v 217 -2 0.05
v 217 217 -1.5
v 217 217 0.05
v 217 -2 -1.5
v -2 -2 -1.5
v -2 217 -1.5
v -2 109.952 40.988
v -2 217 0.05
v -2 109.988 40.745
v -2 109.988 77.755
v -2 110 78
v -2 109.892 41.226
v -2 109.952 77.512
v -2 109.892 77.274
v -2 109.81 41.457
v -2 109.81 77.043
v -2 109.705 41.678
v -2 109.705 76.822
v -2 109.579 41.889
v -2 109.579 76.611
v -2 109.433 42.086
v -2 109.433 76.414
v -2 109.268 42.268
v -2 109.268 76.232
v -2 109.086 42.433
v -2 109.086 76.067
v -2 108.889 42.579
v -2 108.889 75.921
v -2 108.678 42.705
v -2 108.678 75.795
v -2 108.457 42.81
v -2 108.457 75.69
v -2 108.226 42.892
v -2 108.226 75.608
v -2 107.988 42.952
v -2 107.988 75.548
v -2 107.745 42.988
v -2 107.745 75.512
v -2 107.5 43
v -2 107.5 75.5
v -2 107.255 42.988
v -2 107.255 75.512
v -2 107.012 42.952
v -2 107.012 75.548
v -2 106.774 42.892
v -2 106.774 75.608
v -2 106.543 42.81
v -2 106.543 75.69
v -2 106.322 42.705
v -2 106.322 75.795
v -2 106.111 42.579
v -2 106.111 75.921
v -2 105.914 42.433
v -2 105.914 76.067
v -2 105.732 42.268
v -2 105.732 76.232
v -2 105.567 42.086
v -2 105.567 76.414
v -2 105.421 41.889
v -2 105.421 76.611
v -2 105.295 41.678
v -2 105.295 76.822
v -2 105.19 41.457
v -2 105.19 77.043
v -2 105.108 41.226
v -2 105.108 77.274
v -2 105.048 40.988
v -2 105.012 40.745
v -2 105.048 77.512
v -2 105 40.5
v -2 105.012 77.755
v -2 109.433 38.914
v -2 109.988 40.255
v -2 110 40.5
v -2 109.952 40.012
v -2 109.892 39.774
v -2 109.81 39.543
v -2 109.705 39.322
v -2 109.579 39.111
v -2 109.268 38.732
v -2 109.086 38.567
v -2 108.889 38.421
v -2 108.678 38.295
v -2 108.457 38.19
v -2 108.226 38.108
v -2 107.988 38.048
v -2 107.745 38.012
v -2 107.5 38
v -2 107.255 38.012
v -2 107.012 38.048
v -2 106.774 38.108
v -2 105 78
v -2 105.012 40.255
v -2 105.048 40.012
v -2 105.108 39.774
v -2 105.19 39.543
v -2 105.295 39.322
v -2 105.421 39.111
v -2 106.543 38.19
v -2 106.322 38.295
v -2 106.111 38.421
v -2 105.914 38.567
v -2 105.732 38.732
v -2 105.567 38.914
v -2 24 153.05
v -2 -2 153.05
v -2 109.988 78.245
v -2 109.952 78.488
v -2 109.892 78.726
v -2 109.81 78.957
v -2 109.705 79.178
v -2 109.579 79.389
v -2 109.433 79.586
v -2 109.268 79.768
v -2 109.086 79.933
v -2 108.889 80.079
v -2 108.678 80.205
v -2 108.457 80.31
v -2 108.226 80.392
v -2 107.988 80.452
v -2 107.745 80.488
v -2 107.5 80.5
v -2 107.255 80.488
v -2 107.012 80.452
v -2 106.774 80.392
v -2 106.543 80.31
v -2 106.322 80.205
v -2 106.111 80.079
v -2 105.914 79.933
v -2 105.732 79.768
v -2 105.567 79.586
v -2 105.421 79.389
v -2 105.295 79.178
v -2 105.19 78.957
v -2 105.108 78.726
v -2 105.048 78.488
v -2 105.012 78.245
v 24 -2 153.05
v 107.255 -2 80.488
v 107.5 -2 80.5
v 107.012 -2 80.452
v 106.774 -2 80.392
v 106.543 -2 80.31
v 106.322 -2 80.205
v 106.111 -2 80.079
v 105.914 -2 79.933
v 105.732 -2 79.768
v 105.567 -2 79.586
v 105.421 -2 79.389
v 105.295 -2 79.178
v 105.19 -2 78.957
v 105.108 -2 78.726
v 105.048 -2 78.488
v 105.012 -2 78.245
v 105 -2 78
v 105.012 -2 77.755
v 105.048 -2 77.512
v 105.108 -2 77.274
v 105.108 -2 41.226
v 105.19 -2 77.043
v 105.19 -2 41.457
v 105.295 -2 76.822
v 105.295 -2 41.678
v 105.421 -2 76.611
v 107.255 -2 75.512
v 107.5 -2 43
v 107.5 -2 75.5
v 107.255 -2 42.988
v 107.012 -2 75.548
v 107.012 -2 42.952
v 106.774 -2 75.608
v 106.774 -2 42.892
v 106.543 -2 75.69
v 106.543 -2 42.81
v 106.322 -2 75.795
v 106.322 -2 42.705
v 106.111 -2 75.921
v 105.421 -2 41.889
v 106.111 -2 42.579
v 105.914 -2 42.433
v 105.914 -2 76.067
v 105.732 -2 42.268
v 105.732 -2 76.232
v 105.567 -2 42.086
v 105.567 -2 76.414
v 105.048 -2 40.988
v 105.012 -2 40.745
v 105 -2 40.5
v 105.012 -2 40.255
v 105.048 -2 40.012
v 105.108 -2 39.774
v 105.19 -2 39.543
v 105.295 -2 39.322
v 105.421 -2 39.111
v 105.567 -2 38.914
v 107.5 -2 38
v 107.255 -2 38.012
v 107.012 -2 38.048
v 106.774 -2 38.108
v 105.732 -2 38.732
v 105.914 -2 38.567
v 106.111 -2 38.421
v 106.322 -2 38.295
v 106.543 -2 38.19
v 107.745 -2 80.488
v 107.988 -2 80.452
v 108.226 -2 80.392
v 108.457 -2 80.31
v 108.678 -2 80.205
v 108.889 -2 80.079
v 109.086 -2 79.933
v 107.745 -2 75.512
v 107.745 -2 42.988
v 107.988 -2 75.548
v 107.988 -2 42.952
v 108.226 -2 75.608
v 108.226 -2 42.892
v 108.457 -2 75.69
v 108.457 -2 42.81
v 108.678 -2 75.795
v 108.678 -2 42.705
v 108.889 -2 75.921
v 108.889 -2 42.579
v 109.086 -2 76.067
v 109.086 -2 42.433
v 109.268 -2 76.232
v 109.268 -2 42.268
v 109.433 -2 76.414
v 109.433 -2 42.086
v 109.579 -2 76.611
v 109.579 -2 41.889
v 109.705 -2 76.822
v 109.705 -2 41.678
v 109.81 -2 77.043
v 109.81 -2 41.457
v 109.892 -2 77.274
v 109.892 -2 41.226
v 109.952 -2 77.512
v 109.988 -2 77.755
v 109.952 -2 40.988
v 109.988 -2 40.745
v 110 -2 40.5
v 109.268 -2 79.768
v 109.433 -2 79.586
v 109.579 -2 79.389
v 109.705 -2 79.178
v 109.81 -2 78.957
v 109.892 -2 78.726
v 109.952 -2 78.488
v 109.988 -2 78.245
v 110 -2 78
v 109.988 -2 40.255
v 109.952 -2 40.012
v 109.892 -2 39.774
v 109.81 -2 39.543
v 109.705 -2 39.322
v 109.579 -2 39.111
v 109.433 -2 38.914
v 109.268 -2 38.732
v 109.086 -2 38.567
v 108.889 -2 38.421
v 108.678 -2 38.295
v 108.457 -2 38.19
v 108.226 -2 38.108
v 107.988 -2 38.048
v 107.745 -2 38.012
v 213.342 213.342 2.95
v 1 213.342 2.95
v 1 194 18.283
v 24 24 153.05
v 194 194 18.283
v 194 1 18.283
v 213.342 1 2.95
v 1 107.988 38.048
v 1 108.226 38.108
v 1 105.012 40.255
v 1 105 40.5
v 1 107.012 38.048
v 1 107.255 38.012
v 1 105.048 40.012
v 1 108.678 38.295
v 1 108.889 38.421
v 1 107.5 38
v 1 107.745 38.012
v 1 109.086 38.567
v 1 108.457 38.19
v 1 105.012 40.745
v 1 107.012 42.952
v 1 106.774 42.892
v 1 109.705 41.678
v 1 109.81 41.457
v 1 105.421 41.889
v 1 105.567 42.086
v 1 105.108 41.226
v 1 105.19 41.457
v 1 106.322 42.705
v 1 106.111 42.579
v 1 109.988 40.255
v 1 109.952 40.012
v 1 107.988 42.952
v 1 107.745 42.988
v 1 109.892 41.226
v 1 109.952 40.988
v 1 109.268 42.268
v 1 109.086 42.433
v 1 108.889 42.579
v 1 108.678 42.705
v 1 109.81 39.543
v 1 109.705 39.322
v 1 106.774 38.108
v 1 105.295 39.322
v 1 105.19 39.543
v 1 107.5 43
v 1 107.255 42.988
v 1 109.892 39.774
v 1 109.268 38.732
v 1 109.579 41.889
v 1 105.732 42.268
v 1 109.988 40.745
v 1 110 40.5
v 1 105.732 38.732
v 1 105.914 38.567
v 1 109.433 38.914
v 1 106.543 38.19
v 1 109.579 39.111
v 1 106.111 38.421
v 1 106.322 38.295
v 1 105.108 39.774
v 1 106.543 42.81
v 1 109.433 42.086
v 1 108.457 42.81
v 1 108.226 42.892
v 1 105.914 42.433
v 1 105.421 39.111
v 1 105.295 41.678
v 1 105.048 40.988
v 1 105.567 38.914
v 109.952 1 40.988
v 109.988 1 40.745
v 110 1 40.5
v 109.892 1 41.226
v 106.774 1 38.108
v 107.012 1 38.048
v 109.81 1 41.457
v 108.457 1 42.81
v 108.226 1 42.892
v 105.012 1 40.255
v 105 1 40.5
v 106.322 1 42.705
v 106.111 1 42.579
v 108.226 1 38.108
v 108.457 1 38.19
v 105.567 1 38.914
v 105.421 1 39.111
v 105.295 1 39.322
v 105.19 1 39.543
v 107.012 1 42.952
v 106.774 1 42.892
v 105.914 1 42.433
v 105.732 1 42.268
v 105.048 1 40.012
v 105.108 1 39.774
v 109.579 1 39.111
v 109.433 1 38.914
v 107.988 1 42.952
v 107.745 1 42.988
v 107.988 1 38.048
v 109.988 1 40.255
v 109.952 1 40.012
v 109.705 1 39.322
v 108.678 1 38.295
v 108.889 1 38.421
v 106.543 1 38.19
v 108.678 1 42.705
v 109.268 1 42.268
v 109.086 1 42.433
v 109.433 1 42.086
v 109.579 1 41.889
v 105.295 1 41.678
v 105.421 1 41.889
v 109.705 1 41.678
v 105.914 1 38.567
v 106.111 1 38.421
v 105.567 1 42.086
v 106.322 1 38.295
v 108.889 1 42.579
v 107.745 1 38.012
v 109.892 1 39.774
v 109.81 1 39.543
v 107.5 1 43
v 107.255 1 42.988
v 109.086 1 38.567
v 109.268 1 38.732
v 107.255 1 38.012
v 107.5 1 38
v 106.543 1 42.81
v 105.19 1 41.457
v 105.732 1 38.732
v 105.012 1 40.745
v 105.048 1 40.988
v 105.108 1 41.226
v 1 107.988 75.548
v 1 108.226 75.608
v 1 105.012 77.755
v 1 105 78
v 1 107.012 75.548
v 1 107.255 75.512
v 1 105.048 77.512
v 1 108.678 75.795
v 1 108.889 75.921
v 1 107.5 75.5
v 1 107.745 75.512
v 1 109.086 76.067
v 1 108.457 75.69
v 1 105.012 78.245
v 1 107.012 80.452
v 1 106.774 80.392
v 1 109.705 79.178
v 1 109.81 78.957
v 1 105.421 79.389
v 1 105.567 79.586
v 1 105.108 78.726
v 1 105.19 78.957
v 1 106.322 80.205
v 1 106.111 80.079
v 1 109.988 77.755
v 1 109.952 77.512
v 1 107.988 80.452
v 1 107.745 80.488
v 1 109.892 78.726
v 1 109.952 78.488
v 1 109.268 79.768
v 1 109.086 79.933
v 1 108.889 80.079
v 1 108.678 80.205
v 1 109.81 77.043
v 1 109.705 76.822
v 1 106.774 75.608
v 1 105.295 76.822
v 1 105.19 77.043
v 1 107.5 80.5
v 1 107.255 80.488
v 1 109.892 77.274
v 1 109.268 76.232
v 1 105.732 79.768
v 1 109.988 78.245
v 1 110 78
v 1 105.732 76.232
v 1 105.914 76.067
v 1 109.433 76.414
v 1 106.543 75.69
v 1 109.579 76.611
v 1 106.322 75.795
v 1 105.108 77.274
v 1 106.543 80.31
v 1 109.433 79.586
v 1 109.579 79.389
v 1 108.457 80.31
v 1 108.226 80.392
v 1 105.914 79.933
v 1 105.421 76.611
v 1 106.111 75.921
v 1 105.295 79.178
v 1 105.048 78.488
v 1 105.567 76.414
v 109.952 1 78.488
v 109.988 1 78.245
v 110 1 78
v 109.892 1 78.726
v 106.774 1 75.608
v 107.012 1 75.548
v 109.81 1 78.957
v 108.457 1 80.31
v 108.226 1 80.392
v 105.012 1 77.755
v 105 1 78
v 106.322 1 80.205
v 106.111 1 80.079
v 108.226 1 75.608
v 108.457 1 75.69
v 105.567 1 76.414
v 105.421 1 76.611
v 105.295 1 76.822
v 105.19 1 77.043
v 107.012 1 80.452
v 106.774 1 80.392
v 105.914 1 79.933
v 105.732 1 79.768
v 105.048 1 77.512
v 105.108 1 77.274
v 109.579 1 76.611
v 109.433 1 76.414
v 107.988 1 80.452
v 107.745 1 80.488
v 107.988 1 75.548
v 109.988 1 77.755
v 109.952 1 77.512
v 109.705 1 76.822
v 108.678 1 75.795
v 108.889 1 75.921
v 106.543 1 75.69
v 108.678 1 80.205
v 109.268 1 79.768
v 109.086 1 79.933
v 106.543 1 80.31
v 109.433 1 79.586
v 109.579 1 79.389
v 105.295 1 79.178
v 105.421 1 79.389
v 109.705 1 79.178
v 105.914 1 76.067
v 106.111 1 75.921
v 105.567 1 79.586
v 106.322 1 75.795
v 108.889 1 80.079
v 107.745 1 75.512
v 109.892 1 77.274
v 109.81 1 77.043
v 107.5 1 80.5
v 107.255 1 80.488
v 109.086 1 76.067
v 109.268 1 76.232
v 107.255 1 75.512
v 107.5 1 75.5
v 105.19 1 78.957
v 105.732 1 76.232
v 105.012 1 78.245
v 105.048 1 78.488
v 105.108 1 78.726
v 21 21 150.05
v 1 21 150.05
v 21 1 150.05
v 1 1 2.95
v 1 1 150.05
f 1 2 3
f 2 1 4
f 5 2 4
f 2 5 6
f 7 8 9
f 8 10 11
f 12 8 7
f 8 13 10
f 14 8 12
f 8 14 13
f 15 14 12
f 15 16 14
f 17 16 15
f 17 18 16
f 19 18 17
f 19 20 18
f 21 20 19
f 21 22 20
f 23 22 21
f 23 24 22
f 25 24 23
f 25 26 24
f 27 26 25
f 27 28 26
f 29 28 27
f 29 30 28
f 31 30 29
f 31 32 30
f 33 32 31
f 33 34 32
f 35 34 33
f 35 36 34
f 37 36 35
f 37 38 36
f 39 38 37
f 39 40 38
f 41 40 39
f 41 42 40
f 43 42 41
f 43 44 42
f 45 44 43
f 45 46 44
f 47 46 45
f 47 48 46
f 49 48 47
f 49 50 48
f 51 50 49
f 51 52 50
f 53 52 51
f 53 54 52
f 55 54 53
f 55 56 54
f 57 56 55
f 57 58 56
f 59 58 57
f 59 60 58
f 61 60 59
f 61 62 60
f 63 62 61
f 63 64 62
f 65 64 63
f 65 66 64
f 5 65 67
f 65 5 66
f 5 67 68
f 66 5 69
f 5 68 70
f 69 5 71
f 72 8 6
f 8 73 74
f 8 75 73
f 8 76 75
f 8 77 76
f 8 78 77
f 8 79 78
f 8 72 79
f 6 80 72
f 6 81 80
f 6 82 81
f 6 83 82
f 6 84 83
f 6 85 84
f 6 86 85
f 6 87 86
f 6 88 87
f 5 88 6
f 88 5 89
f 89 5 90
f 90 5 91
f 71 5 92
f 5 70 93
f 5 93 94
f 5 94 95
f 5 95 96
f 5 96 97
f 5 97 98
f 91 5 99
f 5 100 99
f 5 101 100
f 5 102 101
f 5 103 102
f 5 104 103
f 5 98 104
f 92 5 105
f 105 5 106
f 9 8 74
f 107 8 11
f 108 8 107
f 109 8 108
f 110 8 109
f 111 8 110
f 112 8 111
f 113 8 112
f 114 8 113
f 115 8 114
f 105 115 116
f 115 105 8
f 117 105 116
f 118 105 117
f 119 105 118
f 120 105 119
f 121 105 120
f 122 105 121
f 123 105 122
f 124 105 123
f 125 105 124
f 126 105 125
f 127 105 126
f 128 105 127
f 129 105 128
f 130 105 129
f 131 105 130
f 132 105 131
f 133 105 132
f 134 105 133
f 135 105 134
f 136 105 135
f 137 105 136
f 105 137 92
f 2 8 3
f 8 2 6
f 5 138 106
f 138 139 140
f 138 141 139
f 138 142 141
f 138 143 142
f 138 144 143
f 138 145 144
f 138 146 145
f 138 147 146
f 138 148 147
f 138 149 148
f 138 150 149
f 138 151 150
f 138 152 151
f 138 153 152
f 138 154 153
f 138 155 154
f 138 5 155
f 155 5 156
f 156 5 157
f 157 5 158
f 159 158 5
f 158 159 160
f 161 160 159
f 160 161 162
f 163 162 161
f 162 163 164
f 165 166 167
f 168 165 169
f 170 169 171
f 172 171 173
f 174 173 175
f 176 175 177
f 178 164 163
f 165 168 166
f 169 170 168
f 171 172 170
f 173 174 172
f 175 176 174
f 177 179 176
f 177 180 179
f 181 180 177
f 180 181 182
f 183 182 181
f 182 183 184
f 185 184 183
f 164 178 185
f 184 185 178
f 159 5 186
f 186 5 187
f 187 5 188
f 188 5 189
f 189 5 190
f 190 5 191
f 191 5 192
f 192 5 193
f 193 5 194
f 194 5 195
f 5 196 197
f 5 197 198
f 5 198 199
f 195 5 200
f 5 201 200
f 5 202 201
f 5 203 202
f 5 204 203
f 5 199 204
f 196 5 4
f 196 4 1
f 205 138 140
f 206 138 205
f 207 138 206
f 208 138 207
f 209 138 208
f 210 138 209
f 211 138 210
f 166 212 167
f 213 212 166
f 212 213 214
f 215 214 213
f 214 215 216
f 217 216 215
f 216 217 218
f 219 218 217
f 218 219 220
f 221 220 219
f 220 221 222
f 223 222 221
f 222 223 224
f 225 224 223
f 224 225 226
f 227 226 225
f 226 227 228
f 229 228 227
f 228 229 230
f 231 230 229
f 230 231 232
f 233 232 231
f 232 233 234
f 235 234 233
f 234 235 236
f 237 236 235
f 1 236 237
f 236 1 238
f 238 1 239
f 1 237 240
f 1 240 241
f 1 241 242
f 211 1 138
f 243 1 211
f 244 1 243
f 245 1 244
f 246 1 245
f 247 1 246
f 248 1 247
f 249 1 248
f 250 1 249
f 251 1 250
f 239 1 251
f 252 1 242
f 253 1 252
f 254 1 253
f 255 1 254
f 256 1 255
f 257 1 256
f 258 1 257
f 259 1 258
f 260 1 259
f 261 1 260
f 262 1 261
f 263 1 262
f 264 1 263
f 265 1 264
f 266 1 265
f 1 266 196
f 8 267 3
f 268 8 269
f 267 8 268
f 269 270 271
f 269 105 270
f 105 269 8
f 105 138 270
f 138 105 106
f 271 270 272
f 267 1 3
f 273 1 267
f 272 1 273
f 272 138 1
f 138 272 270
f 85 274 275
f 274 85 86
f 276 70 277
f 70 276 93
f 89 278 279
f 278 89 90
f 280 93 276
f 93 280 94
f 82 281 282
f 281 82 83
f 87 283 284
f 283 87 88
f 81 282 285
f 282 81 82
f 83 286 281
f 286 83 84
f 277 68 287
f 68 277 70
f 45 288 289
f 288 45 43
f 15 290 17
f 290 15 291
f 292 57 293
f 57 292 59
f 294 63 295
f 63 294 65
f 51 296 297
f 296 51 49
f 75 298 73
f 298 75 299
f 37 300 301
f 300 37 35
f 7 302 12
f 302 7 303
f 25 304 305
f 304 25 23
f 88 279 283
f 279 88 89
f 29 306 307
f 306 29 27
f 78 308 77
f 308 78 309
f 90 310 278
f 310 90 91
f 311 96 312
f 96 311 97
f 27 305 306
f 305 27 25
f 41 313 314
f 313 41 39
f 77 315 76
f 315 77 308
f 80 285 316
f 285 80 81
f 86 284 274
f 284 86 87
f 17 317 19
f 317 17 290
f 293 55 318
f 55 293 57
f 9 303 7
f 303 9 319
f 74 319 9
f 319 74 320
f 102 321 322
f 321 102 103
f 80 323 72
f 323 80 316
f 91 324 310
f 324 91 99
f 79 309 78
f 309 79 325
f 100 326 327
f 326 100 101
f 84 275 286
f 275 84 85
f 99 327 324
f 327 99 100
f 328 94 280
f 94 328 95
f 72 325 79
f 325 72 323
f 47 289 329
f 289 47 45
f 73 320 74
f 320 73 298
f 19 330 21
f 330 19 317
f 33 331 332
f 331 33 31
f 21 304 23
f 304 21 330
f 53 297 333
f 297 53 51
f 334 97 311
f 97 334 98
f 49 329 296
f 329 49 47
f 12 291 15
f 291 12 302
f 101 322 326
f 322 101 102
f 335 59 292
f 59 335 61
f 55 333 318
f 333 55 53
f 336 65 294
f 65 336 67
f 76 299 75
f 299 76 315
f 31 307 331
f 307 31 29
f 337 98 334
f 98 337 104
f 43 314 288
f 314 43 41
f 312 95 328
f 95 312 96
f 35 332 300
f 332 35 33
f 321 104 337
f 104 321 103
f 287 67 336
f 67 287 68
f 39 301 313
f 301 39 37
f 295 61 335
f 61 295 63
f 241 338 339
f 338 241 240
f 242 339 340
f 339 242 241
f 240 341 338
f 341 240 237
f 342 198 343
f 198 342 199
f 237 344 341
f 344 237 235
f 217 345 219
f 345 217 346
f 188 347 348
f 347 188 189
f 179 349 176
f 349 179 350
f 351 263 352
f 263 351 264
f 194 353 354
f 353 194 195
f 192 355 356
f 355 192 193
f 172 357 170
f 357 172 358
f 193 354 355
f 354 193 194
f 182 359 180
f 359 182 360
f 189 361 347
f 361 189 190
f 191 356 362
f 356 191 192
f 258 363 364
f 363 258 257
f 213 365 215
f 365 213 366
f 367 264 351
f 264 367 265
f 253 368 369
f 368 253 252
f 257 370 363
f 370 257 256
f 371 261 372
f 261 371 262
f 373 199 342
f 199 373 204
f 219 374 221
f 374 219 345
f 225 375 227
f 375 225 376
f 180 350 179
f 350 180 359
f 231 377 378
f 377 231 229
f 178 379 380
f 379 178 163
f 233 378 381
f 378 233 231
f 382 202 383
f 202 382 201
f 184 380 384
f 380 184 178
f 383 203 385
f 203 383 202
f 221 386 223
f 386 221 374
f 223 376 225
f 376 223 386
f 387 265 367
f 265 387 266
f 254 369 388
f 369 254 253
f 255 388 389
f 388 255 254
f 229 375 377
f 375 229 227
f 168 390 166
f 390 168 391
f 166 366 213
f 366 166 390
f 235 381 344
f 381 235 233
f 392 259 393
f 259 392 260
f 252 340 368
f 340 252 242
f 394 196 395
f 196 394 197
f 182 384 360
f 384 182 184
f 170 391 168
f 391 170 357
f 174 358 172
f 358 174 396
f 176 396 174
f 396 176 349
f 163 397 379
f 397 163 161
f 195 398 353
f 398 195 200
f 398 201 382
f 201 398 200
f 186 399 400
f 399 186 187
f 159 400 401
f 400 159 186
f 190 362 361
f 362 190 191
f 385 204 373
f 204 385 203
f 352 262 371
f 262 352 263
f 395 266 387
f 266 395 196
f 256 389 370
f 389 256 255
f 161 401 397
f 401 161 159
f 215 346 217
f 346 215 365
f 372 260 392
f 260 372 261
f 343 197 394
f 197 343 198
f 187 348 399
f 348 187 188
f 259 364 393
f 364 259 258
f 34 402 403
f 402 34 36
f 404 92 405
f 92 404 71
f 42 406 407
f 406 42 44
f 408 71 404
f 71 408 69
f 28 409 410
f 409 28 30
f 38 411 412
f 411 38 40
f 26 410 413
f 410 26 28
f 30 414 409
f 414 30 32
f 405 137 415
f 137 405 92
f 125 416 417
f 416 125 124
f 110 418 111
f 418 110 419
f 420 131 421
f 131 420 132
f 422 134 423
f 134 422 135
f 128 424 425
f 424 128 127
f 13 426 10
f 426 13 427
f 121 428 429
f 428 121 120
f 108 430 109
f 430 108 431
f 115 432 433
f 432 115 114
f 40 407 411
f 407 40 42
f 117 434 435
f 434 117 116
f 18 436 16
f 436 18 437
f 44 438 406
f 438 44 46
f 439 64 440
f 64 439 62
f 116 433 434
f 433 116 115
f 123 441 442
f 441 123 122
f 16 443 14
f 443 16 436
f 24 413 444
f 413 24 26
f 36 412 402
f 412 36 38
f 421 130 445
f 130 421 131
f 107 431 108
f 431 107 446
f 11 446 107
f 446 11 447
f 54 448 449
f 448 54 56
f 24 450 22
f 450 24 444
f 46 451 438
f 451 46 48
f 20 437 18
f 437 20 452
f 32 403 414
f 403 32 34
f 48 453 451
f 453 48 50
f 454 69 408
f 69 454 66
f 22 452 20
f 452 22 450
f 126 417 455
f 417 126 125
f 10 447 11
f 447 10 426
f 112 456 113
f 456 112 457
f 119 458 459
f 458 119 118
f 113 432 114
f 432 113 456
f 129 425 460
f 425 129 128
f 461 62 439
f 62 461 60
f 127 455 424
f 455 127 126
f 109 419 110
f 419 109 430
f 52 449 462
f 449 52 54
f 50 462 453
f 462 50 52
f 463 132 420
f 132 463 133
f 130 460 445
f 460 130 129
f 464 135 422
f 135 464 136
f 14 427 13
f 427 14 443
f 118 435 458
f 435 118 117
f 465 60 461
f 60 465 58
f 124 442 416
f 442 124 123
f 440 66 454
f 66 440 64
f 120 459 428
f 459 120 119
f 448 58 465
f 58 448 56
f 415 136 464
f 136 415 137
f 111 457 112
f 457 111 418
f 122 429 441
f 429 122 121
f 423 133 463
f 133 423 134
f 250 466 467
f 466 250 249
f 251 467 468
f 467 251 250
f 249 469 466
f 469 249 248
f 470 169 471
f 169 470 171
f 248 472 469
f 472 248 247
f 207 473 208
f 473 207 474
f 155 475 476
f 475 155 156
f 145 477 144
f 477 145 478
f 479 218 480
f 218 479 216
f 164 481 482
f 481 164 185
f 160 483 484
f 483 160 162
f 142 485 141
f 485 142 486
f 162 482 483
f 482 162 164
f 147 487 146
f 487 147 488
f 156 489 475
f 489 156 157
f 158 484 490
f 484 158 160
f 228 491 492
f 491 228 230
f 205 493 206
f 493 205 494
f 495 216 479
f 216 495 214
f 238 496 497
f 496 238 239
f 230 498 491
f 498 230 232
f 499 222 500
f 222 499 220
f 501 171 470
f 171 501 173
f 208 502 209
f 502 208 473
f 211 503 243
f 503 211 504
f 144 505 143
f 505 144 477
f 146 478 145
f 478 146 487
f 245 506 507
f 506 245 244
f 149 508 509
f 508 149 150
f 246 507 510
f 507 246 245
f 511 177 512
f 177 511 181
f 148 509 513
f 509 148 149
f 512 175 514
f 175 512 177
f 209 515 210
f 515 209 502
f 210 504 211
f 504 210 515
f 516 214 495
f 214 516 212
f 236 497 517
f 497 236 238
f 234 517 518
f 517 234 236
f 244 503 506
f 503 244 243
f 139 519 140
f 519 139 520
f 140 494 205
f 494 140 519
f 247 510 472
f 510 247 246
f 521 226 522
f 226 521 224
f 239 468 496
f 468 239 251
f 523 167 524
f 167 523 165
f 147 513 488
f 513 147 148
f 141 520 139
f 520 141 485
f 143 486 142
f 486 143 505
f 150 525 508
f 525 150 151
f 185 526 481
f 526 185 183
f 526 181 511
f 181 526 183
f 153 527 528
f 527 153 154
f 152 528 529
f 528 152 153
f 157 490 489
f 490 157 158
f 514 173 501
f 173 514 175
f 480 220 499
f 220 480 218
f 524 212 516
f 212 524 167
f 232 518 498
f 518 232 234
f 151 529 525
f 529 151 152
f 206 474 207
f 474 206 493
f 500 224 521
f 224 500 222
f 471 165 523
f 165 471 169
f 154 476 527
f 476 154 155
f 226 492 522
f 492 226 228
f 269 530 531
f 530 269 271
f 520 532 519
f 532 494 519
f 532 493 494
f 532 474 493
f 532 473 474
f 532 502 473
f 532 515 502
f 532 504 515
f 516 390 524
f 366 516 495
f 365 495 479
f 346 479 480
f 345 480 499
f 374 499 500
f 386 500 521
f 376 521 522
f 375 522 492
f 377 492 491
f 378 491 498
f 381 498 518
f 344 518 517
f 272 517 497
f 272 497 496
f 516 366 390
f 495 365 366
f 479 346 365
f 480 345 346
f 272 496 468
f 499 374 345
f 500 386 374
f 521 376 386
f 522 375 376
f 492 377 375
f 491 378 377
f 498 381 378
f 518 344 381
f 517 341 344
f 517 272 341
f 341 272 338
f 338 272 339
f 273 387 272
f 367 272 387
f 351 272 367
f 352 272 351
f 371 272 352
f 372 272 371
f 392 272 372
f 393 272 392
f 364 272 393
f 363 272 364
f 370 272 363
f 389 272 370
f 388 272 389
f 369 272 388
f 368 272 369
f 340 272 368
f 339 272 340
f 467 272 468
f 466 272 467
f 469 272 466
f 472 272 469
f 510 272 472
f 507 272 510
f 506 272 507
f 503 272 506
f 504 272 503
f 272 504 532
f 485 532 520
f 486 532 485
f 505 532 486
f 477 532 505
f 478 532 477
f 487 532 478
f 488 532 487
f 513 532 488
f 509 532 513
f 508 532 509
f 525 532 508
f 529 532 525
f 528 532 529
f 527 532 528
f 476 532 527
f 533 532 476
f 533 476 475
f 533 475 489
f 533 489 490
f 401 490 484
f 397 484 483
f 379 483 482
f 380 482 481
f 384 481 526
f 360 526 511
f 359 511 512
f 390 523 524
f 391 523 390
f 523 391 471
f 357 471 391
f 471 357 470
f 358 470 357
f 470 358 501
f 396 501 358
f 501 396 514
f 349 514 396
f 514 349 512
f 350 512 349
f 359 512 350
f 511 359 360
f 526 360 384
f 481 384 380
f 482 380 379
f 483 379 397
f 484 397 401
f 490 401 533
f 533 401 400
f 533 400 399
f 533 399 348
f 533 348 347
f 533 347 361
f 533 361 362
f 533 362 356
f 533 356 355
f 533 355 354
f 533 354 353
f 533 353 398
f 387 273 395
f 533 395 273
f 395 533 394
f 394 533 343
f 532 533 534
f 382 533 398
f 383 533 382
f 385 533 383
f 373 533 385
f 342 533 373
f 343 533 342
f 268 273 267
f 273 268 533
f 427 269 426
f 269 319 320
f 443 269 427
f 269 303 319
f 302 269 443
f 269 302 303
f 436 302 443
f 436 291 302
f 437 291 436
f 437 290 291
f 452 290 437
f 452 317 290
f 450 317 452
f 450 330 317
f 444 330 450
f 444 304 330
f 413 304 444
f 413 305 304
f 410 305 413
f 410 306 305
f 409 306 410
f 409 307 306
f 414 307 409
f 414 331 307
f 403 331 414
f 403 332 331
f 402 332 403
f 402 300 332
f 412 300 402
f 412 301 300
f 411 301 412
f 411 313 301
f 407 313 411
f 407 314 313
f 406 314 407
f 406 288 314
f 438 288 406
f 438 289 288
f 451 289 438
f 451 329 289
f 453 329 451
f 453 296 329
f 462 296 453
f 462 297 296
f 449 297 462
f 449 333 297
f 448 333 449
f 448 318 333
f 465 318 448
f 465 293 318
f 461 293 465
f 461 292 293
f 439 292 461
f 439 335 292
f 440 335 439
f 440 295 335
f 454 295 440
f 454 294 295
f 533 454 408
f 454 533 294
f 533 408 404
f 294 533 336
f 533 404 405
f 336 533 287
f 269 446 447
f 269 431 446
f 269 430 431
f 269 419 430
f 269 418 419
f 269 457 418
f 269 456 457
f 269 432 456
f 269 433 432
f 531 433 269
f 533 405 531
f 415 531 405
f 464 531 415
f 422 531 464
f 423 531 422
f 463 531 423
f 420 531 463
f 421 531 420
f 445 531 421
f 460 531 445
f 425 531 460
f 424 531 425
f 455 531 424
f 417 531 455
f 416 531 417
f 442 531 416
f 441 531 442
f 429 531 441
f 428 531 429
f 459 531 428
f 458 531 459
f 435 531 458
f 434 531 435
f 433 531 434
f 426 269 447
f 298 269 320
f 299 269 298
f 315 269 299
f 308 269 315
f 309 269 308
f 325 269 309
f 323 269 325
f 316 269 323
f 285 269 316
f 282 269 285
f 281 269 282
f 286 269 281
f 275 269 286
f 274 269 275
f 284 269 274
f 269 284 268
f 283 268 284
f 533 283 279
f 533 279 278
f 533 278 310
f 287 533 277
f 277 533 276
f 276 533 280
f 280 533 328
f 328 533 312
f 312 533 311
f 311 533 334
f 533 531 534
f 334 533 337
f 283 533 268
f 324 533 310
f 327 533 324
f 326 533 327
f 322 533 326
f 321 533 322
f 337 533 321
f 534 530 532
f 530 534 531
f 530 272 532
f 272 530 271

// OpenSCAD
$fn = 64;
difference() {
	union() {
		difference() {
			translate(v = [107.5, 107.5, 0]) {
				cube(center = true, size = [219.0, 219.0, 3]);
			}
			translate(v = [107.5, 107.5, 1.5]) {
				cube(center = true, size = [219.0, 219.0, 3.1]);
			}
		}
		hull() {
			translate(v = [107.5, 107.5, 0]) {
				cube(center = true, size = [219.0, 219.0, 0.1]);
			}
			translate(v = [11.0, 11.0, 153]) {
				cube(center = true, size = [26.0, 26.0, 0.1]);
			}
		}
	}
	hull() {
		translate(v = [107.5, 107.5, 3]) {
			cube(center = true, size = [213.0, 213.0, 0.1]);
		}
		translate(v = [11.0, 11.0, 150]) {
			cube(center = true, size = [20.0, 20.0, 0.1]);
		}
	}
	union() {
		translate(v = [0, 107.5, 40.5]) {
			rotate(a = [0, 90, 0]) {
				cylinder(center = true, h = 30, r = 2.5);
			}
		}
		translate(v = [107.5, 0, 40.5]) {
			rotate(a = [90, 0, 0]) {
				cylinder(center = true, h = 30, r = 2.5);
			}
		}
		translate(v = [0, 107.5, 78.0]) {
			rotate(a = [0, 90, 0]) {
				cylinder(center = true, h = 30, r = 2.5);
			}
		}
		translate(v = [107.5, 0, 78.0]) {
			rotate(a = [90, 0, 0]) {
				cylinder(center = true, h = 30, r = 2.5);
			}
		}
		translate(v = [0, 107.5, 115.5]) {
			rotate(a = [0, 90, 0]) {
				cylinder(center = true, h = 30, r = 2.5);
			}
		}
		translate(v = [107.5, 0, 115.5]) {
			rotate(a = [90, 0, 0]) {
				cylinder(center = true, h = 30, r = 2.5);
			}
		}
	}
}
